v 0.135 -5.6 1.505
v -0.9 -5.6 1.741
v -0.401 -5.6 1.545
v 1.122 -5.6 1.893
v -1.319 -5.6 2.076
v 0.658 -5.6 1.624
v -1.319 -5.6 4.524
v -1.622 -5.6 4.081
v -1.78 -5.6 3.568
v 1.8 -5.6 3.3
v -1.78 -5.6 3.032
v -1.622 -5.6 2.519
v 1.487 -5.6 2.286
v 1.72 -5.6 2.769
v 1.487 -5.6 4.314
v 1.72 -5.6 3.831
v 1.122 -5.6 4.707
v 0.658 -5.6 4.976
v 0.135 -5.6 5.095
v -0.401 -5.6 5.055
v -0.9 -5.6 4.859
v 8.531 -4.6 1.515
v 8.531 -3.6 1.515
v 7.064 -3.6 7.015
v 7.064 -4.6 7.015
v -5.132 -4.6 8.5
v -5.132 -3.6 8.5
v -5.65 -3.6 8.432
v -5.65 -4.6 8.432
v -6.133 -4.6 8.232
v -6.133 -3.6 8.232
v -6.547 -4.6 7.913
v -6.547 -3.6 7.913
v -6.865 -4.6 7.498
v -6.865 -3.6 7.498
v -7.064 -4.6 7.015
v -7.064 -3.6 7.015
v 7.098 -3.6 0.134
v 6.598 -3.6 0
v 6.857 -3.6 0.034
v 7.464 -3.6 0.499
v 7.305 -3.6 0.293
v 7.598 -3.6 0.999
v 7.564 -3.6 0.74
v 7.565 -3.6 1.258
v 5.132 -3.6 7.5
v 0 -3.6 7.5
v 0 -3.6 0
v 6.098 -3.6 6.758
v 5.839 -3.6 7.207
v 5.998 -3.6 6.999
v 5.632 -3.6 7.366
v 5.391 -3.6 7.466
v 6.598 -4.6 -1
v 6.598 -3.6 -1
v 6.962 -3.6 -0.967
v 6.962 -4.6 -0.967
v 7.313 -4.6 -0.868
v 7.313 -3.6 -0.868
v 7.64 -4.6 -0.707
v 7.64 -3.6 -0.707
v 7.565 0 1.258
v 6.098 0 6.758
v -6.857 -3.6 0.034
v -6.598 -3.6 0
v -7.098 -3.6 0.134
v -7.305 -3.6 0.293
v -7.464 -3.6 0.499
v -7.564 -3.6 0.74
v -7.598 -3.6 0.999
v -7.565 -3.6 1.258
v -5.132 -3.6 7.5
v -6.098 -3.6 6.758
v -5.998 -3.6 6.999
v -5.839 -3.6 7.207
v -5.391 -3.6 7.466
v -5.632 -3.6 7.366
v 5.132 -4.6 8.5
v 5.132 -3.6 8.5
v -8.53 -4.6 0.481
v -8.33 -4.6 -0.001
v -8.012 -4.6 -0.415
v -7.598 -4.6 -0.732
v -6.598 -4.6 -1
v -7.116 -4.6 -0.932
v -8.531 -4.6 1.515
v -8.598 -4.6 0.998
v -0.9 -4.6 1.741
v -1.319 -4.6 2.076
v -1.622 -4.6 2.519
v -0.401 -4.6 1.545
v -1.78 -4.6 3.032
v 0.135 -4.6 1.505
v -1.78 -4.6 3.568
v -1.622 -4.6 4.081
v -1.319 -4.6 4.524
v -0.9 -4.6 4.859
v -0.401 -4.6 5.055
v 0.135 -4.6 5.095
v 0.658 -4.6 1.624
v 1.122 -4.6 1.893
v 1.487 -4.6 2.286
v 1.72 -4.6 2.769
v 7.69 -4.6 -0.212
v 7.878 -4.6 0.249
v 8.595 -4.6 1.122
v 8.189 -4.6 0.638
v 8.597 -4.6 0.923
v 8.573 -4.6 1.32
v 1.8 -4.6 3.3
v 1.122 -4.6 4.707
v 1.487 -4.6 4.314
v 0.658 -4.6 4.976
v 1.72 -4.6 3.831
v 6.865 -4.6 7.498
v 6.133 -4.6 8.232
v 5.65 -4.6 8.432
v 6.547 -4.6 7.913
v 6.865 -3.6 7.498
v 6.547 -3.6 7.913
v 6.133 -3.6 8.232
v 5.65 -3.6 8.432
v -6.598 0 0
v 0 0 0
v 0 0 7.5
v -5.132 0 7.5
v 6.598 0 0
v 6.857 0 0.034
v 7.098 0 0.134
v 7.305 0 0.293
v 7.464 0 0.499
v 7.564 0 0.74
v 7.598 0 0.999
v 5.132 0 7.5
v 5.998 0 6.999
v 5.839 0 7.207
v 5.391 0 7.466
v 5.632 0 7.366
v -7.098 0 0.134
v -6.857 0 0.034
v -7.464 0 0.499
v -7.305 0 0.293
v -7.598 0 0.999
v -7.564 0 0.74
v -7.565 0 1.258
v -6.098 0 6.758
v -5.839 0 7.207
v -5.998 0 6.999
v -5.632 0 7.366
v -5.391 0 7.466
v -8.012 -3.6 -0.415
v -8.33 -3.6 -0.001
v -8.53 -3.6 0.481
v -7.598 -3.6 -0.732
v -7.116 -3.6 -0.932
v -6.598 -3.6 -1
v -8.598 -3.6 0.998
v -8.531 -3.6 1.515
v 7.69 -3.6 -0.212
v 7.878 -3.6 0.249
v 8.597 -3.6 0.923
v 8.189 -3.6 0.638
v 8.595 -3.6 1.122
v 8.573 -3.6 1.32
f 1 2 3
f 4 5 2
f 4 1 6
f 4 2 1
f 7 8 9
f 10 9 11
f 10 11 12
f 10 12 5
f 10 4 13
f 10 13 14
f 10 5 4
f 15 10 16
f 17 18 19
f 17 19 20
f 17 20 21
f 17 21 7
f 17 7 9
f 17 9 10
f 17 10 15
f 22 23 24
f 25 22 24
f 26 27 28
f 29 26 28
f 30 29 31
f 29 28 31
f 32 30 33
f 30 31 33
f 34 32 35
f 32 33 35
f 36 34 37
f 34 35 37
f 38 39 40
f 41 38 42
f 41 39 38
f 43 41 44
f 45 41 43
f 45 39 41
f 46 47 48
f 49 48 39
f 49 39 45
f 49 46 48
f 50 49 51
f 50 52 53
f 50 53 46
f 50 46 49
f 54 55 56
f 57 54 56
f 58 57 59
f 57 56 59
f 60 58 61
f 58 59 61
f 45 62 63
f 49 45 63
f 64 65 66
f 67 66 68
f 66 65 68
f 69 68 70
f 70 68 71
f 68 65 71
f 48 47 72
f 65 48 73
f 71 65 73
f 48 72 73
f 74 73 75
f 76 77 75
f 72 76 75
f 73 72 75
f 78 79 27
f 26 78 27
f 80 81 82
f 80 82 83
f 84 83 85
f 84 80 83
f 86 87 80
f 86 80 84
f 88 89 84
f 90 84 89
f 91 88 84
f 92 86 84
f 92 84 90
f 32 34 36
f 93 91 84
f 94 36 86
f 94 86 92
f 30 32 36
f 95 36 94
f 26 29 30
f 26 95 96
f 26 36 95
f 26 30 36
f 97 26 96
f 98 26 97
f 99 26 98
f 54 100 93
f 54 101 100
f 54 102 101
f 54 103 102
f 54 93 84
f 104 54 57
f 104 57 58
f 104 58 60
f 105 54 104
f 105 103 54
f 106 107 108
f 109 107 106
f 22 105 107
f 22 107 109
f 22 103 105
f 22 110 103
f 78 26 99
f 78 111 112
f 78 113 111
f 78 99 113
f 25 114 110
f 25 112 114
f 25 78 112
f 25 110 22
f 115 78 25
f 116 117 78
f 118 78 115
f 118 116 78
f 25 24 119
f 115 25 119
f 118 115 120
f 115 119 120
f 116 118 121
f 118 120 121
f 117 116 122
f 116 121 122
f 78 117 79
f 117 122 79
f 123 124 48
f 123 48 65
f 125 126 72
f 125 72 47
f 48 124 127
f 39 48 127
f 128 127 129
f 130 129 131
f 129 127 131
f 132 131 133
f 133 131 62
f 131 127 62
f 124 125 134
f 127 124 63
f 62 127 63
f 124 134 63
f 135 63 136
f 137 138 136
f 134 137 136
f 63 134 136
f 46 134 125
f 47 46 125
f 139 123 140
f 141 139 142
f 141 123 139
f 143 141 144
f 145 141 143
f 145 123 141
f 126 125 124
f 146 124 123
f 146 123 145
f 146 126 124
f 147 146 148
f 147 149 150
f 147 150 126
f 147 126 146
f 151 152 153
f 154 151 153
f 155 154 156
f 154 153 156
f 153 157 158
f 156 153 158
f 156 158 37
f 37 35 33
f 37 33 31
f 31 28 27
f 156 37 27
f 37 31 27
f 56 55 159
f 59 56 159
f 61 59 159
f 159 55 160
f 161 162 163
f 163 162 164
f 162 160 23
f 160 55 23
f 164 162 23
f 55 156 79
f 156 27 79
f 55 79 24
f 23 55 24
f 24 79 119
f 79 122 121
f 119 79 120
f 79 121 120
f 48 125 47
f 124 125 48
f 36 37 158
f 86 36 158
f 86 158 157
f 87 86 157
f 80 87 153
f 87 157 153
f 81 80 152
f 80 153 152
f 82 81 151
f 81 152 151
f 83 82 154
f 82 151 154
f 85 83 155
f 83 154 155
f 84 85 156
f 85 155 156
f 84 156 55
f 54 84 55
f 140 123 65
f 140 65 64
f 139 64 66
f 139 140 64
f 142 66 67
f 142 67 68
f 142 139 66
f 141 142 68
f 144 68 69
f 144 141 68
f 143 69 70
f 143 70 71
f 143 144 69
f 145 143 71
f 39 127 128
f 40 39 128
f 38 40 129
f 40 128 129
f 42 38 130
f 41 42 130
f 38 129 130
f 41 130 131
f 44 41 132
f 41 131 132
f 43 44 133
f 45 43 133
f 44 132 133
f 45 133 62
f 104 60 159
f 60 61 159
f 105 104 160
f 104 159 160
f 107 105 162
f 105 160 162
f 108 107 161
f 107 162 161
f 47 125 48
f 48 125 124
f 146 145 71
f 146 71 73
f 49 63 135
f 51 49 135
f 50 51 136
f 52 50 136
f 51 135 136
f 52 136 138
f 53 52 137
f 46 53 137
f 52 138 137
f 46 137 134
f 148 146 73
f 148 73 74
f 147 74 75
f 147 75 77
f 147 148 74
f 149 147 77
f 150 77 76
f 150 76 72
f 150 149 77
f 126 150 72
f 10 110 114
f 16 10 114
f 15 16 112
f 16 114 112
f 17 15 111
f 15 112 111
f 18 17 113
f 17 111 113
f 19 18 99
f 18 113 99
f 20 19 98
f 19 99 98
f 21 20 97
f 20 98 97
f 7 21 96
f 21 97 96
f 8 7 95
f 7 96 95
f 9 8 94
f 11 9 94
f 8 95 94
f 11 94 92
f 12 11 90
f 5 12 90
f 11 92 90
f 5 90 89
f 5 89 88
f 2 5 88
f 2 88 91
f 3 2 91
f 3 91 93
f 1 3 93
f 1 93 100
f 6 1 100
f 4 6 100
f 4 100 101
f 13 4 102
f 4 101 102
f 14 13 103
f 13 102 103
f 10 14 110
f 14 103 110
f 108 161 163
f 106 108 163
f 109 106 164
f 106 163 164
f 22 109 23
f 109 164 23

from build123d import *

# Parameters (mm, degrees)
F1_DEPTH = 3.6
F2_W     = 2
F2_H     = 9.5
F3_DEPTH = 1
F4_R     = 1.7401329742
F5_DEPTH = 25
F6_R     = 1.8
F7_DEPTH = 1


# Not quite as in the source:
# - a pattern or mirror of a feature is missing from the dataset's text; its kind, count and spacing are read off the source's solid
# - a feature names something its author has since deleted; it is built from what else it names


with BuildPart() as f1:
    # F0 (on Front) → F1 (new body)
    with BuildSketch(Plane.XZ):
        with BuildLine():
            Line((0, 7.5), (0, 0))
            Line((0, 0), (6.5983883536, 0))
            ThreePointArc((6.5983883536, 0), (7.3913772093, 0.3907638596), (7.5646232932, 1.2576626506))
            Line((7.5646232932, 1.2576626506), (6.0979566265, 6.7576626506))
            ThreePointArc((6.0979566265, 6.7576626506), (5.7409578273, 7.2929888557), (5.1317216869, 7.5))
            Line((5.1317216869, 7.5), (0, 7.5))
        make_face()
    extrude(amount=F1_DEPTH)


with BuildPart() as f1_copies_1:
    # F1_copies: instance of F1
    add(f1.part.mirror(Plane(origin=(0, 0, 0), x_dir=(0, 0, -1), z_dir=(-1, 0, 0))))


with BuildPart() as f3:
    # F2 (on face) → F3 (new body)
    with BuildSketch(Plane.XZ.offset(3.6)):
        with BuildLine():
            Line((1, -1), (6.5983883536, -1))
            ThreePointArc((6.5983883536, -1), (8.184366065, -0.2184722807), (8.5308582328, 1.5153253011))
            Line((8.5308582328, 1.5153253011), (7.0641915661, 7.0153253011))
            ThreePointArc((7.0641915661, 7.0153253011), (6.3501939676, 8.0859777114), (5.1317216869, 8.5))
            Line((5.1317216869, 8.5), (1, 8.5))
            Line((1, 8.5), (1, -1))
        make_face()
        with Locations((0, 3.75)):
            Rectangle(F2_W, F2_H)
        with BuildLine():
            Line((-6.5983883536, -1), (-1, -1))
            Line((-1, -1), (-1, 8.5))
            Line((-1, 8.5), (-5.1317216869, 8.5))
            ThreePointArc((-5.1317216869, 8.5), (-6.3501939676, 8.0859777114), (-7.0641915661, 7.0153253011))
            Line((-7.0641915661, 7.0153253011), (-8.5308582328, 1.5153253011))
            ThreePointArc((-8.5308582328, 1.5153253011), (-8.184366065, -0.2184722807), (-6.5983883536, -1))
        make_face()
    extrude(amount=F3_DEPTH)

    # F4 (on face) → F5 (cut)
    with BuildSketch(Plane(origin=(0, -3.6, 0), x_dir=(-1, 0, 0), z_dir=(0, 1, 0))):
        with Locations((-9.3786362559, -0.6318259402)):
            Circle(F4_R)
    extrude(amount=-F5_DEPTH, mode=Mode.SUBTRACT)

    # F6 (on face) → F7 (join)
    with BuildSketch(Plane.XZ.offset(4.6)):
        with Locations((0, 3.3)):
            Circle(F6_R)
    extrude(amount=F7_DEPTH)


solid = Compound([f1.part, f1_copies_1.part, f3.part])
